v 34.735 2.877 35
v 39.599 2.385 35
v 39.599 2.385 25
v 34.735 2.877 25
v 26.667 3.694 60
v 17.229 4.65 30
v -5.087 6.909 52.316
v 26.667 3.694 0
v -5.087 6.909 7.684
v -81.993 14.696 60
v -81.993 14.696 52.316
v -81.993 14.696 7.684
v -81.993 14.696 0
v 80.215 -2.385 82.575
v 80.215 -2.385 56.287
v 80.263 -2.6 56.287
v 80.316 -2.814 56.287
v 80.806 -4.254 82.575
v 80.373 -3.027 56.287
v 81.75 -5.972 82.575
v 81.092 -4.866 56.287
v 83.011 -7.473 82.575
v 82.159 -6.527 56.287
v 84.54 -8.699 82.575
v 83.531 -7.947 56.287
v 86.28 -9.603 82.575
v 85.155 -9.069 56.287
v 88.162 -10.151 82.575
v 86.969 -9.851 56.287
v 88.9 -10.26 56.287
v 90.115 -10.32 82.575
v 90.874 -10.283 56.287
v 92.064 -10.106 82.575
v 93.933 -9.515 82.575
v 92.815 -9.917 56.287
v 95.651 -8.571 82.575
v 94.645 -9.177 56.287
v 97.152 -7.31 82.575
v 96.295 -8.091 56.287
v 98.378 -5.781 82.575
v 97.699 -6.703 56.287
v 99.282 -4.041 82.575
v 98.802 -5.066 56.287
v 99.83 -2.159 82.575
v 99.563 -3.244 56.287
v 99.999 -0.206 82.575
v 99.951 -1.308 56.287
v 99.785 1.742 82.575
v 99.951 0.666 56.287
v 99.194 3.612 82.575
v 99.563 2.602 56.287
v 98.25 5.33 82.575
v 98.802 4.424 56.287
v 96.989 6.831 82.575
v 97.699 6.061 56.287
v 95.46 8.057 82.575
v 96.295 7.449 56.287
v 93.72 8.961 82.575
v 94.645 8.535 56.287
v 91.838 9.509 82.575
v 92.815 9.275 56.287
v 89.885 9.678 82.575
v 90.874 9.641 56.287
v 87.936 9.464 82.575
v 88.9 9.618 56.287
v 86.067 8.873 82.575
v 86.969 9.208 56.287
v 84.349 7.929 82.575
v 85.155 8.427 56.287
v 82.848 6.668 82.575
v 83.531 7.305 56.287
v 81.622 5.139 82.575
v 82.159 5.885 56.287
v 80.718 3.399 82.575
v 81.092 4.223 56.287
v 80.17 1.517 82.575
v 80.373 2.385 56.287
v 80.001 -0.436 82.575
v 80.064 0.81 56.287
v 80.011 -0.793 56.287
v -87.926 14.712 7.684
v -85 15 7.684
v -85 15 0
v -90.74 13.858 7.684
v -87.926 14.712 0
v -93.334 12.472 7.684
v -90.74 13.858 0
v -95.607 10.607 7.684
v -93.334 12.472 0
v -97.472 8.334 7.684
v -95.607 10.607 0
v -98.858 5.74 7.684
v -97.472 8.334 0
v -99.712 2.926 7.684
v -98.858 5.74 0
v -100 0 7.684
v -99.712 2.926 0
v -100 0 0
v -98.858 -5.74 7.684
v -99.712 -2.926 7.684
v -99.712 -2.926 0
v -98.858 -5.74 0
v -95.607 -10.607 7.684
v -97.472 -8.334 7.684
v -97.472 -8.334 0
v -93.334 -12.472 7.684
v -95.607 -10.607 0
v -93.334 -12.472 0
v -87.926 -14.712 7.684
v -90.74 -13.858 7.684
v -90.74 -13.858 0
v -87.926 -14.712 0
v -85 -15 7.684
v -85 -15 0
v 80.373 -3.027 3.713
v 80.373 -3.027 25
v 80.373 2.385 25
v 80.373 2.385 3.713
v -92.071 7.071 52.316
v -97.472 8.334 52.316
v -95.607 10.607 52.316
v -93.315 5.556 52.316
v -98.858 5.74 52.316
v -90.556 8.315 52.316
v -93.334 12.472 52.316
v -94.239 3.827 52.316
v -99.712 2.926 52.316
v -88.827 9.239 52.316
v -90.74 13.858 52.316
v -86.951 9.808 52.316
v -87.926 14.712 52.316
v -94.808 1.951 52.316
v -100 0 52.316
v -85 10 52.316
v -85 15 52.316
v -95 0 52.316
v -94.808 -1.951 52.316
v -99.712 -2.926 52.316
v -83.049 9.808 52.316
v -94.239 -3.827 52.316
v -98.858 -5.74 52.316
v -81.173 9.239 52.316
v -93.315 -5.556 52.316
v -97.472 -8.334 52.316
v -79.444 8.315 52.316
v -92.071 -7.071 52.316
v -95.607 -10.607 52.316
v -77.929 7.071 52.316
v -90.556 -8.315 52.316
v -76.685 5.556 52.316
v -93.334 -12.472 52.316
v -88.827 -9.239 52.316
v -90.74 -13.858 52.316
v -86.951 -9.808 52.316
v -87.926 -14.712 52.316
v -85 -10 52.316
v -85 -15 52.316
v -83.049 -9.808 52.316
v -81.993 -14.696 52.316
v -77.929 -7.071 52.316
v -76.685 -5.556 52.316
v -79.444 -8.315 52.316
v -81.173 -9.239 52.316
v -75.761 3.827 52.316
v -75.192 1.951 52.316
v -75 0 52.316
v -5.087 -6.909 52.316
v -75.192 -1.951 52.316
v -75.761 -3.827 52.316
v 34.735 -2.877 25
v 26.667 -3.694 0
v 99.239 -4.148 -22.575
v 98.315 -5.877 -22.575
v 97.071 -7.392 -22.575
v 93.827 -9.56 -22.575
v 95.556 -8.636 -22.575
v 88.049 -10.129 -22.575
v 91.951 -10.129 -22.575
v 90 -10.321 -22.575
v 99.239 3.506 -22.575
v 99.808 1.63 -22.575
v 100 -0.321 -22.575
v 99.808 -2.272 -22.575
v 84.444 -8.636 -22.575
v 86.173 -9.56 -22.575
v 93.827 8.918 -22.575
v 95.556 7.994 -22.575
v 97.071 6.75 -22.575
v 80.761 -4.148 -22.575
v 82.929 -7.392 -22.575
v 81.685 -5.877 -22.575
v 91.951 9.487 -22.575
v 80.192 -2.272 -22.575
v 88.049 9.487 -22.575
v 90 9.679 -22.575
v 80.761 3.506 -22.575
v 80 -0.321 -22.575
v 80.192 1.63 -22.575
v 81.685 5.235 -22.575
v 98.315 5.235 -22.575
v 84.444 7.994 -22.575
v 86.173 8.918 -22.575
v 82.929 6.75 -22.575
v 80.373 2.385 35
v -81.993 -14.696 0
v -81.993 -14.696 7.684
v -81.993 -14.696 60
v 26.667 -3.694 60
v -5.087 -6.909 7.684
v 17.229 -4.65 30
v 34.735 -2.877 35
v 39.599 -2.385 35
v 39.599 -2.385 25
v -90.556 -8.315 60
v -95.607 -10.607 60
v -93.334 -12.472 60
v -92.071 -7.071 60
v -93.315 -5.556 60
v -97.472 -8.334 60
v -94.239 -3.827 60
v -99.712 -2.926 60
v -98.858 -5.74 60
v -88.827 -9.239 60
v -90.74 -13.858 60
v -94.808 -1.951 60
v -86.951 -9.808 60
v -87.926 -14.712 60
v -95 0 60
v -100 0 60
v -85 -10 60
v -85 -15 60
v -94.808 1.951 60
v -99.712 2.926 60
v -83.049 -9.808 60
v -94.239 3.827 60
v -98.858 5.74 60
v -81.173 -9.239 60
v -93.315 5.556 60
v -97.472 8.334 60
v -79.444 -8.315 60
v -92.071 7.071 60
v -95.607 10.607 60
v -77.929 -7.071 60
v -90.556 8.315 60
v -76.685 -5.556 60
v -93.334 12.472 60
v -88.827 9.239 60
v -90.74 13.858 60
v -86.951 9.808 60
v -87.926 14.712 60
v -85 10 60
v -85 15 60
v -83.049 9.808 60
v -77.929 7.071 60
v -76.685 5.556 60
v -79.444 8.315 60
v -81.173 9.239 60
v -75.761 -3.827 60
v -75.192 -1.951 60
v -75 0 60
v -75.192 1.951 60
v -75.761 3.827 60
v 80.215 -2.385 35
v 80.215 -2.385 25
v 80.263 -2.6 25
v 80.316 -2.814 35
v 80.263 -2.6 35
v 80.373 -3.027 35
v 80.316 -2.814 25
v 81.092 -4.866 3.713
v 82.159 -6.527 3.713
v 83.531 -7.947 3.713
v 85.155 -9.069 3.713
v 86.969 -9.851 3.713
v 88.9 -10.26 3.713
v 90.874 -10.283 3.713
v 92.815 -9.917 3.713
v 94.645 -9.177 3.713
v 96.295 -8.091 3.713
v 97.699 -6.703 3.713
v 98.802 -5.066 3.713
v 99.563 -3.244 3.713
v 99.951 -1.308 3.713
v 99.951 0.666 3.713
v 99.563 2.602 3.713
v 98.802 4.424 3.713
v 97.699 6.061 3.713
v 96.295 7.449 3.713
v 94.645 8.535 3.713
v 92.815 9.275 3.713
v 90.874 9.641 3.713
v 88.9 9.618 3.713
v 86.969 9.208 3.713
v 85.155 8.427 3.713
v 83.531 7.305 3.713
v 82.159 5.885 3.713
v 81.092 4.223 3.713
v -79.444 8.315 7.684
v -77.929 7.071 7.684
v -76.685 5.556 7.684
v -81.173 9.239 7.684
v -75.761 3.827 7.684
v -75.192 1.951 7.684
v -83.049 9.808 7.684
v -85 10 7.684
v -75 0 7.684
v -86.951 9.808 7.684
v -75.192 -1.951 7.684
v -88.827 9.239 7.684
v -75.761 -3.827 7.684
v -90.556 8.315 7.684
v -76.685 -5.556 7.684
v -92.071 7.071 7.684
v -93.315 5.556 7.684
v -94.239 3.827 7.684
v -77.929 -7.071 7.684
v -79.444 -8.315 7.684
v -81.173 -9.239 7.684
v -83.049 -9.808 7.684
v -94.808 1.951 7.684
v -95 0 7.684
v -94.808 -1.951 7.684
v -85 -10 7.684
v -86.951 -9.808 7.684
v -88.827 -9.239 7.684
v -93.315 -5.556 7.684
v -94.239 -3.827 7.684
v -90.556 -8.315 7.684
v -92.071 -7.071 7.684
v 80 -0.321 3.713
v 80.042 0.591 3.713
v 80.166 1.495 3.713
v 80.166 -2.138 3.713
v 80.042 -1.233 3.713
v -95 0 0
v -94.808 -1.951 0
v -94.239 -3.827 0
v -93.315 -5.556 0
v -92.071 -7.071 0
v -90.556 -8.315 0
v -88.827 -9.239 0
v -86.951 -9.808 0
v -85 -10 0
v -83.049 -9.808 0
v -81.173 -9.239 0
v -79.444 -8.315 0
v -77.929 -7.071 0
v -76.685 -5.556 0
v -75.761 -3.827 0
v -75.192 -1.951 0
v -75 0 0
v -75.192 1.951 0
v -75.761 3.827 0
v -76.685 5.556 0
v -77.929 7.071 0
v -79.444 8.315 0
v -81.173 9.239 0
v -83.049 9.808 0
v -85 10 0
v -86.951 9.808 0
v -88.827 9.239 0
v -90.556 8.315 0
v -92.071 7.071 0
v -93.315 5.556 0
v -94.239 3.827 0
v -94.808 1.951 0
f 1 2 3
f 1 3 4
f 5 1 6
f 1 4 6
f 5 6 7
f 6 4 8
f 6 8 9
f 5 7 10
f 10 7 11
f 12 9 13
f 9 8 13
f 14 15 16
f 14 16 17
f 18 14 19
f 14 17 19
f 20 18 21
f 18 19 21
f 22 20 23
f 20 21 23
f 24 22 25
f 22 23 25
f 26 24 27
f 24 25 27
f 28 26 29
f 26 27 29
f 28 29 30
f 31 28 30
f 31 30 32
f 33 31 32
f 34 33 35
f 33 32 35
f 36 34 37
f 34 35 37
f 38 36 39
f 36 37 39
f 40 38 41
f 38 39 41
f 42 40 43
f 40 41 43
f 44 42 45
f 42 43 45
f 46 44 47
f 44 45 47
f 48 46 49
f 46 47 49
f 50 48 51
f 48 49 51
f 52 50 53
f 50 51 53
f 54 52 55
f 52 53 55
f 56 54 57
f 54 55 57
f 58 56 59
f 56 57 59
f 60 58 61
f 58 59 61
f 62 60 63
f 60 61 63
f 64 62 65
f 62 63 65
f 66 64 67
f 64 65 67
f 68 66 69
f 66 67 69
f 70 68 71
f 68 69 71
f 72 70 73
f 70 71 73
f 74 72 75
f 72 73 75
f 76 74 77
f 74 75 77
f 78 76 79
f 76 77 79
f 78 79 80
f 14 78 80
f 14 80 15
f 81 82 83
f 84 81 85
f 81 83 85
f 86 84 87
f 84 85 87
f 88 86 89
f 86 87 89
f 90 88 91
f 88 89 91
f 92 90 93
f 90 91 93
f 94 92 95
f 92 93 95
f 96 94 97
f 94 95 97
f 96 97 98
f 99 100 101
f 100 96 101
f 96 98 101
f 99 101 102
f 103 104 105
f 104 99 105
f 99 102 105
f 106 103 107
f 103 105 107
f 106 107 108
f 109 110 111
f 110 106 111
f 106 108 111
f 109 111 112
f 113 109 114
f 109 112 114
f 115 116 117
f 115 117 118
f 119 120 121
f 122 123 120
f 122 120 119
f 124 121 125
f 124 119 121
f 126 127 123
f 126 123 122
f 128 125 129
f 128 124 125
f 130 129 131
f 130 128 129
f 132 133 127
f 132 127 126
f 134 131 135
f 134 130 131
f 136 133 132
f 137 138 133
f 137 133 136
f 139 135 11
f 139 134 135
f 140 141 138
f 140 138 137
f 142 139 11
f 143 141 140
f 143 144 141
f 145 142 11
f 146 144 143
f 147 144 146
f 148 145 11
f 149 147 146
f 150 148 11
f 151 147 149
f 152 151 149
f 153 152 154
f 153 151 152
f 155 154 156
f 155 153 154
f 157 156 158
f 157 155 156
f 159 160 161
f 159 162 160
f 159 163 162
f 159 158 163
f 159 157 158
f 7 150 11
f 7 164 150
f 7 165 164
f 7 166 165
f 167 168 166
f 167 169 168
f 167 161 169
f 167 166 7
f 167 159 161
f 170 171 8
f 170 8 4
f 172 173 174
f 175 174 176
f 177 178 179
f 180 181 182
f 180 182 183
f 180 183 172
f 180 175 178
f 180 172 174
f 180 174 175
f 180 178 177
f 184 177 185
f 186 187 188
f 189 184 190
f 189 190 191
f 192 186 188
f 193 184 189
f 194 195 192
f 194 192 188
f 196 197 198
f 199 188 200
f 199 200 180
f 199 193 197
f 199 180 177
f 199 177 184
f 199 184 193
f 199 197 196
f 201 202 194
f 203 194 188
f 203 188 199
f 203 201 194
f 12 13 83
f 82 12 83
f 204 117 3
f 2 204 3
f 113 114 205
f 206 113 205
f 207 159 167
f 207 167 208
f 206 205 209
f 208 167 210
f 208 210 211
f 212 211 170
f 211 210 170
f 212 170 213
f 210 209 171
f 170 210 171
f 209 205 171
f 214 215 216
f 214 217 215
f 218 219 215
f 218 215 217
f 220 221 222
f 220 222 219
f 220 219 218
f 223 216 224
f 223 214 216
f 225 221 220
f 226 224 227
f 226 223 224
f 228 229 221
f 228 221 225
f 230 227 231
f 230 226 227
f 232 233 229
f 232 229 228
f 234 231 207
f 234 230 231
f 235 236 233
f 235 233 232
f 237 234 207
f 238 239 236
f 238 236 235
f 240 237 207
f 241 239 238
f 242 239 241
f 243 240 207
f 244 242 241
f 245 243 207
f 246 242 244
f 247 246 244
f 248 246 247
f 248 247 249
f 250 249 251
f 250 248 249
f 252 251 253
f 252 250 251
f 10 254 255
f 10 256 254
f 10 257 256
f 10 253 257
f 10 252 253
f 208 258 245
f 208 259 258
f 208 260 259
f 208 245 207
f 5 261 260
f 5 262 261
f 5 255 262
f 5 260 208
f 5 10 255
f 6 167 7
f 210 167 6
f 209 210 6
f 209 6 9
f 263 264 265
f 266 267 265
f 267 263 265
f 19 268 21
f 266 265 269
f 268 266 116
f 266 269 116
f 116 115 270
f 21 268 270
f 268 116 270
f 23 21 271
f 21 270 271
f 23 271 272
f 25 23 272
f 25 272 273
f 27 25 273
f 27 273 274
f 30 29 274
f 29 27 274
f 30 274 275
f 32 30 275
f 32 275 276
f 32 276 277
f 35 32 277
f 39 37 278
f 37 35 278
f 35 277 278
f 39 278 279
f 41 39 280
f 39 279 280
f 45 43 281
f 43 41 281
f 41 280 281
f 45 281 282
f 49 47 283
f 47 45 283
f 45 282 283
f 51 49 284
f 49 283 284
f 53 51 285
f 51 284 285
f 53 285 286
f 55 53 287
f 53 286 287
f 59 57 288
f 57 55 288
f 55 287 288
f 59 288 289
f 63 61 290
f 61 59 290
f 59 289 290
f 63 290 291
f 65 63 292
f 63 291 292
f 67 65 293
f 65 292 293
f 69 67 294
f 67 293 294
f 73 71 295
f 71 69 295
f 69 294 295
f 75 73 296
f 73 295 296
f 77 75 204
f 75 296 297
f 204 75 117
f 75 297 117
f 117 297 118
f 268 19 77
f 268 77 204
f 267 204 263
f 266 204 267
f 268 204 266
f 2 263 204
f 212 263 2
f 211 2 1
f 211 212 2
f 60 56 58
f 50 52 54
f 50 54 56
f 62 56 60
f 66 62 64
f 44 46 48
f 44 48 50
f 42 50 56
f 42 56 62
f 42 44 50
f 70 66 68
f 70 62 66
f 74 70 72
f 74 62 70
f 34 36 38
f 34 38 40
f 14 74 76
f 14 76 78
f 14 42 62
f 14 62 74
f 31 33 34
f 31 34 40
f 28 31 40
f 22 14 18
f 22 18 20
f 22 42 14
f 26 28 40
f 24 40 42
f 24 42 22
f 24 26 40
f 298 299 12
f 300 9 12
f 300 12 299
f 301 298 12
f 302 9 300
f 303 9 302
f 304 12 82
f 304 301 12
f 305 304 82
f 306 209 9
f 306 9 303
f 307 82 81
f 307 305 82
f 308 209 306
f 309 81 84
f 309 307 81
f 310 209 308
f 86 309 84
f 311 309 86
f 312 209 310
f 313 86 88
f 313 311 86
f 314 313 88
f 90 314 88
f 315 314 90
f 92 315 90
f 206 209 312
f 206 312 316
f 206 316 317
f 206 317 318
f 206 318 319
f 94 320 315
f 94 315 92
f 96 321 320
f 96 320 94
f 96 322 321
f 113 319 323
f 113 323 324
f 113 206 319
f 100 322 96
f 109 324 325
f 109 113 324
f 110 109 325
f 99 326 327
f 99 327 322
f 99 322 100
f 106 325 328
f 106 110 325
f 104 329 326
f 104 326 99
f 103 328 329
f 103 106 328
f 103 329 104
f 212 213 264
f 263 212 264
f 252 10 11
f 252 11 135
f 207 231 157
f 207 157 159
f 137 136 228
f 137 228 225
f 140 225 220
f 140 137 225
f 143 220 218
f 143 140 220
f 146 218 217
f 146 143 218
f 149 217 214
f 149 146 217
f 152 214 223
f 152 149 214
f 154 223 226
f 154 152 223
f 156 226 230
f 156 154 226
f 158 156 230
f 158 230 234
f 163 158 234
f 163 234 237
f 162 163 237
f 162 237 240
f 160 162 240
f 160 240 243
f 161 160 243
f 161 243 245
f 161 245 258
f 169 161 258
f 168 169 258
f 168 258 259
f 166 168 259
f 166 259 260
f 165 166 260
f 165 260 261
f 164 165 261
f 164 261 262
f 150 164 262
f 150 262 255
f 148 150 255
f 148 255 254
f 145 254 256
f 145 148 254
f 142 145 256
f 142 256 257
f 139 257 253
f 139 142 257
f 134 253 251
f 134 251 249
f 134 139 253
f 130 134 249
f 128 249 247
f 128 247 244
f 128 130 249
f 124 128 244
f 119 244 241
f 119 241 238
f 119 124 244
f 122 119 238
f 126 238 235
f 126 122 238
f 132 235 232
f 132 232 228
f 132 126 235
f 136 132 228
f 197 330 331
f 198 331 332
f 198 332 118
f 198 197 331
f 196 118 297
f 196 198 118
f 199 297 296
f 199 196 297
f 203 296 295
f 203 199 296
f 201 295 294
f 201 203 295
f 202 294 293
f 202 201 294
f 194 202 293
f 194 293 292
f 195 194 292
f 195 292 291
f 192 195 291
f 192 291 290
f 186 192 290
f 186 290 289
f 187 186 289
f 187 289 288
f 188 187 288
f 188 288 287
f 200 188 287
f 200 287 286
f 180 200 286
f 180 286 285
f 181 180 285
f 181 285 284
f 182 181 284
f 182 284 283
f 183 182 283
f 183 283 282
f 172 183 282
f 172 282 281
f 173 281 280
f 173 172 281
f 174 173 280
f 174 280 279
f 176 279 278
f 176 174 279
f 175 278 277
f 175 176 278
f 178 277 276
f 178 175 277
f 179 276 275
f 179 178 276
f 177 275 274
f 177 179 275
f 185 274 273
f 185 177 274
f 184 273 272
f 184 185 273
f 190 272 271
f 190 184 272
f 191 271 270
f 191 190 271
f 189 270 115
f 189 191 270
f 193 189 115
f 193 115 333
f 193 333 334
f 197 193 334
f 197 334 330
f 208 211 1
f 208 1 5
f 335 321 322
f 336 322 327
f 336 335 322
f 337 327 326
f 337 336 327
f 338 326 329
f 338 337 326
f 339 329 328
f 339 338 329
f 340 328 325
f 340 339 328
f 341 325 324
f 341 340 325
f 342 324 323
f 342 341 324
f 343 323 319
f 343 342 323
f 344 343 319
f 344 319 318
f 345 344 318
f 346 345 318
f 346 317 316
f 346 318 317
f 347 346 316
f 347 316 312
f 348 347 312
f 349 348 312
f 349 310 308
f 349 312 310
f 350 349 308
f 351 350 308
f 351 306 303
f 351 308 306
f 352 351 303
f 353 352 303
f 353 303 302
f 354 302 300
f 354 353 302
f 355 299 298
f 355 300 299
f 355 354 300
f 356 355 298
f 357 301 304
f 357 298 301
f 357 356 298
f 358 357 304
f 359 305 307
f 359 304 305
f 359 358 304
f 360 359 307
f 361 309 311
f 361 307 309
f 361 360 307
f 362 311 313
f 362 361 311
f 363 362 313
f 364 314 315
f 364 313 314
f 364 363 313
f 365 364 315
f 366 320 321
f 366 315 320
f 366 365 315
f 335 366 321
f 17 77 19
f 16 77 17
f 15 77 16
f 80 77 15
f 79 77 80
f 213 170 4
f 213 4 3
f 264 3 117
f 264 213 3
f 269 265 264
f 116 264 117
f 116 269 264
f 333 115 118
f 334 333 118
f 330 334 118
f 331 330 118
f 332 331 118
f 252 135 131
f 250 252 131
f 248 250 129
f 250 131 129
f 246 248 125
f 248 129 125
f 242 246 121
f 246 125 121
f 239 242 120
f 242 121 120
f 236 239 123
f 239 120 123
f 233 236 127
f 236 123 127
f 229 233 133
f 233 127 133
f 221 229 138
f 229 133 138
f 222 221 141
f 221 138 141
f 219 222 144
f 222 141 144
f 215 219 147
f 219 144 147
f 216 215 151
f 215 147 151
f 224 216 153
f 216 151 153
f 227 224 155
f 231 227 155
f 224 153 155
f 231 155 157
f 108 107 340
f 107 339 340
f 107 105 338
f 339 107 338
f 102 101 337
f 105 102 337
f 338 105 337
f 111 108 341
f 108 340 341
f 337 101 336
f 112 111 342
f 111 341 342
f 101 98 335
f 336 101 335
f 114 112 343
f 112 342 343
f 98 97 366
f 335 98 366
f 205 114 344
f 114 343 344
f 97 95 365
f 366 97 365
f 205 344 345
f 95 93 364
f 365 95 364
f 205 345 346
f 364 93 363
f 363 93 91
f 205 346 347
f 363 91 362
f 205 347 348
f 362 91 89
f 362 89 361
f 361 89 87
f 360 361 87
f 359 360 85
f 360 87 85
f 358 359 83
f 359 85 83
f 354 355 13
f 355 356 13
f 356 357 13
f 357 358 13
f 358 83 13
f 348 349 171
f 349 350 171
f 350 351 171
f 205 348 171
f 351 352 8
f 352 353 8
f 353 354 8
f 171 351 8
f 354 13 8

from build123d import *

# Parameters (mm, degrees)
SKETCH1_R           = 10
BOSS_EXTRUDE1_DEPTH = 60
SKETCH2_OUTSIDE_W   = 244.19
SKETCH2_OUTSIDE_H   = 104.19
CUT_EXTRUDE1_DEPTH  = 20
SKETCH3_R           = 10
BOSS_EXTRUDE2_DEPTH = 26.2874406
BOSS_EXTRUDE3_START = 26.2874406
SKETCH4_R           = 10
BOSS_EXTRUDE3_DEPTH = 26.2874406


with BuildPart() as part:
    # Sketch1 → Boss-Extrude1 (new body)
    with BuildSketch(Plane.XY):
        with BuildLine():
            ThreePointArc((-85, 15), (-100, 0), (-85, -15))
            Line((-85, -15), (39.599219547, -2.384625528))
            Line((39.599219547, -2.384625528), (80.215221564, -2.384625528))
            ThreePointArc((80.215221564, -2.384625528), (99.994531838, -0.651762376), (80.373005951, 2.384625528))
            Line((80.373005951, 2.384625528), (39.599219547, 2.384625528))
            Line((39.599219547, 2.384625528), (-85, 15))
        make_face()
        with Locations((-85, 0)):
            Circle(SKETCH1_R, mode=Mode.SUBTRACT)
    extrude(amount=BOSS_EXTRUDE1_DEPTH)

    # Sketch2 outside → Cut-Extrude1 (cut, symmetric)
    with BuildSketch(Plane(origin=(0, 2.384625528, 0), x_dir=(1, 0, 0), z_dir=(0, 1, 0))):
        with Locations((0, -30)):
            Rectangle(SKETCH2_OUTSIDE_W, SKETCH2_OUTSIDE_H)
        Polygon((34.734743134, -25), (26.666623154, 0), (-100, 0), (-100, -7.68377667), (-5.086975799, -7.68377667), (17.229247531, -30), (-5.086975799, -52.31622333), (-100, -52.31622333), (-100, -60), (26.666623154, -60), (34.734743134, -35), (80.373005951, -35), (80.373005951, -56.2874406), (100, -56.2874406), (100, -3.7125594), (80.373005951, -3.7125594), (80.373005951, -25), align=None, mode=Mode.SUBTRACT)
    extrude(amount=CUT_EXTRUDE1_DEPTH, both=True, mode=Mode.SUBTRACT)

    # Sketch3 → Boss-Extrude2 (add)
    with BuildSketch(Plane.XY.offset(56.2874406)):
        with Locations((90, -0.321106458)):
            Circle(SKETCH3_R)
    extrude(amount=BOSS_EXTRUDE2_DEPTH)

    # Sketch4 → Boss-Extrude3 (add)
    with BuildSketch(Plane(origin=(0, 0, 3.7125594), x_dir=(-1, 0, 0), z_dir=(0, 0, -1)).offset(BOSS_EXTRUDE3_START)):
        with Locations((-90, -0.321106458)):
            Circle(SKETCH4_R)
    extrude(amount=-BOSS_EXTRUDE3_DEPTH)


solid = part.part
